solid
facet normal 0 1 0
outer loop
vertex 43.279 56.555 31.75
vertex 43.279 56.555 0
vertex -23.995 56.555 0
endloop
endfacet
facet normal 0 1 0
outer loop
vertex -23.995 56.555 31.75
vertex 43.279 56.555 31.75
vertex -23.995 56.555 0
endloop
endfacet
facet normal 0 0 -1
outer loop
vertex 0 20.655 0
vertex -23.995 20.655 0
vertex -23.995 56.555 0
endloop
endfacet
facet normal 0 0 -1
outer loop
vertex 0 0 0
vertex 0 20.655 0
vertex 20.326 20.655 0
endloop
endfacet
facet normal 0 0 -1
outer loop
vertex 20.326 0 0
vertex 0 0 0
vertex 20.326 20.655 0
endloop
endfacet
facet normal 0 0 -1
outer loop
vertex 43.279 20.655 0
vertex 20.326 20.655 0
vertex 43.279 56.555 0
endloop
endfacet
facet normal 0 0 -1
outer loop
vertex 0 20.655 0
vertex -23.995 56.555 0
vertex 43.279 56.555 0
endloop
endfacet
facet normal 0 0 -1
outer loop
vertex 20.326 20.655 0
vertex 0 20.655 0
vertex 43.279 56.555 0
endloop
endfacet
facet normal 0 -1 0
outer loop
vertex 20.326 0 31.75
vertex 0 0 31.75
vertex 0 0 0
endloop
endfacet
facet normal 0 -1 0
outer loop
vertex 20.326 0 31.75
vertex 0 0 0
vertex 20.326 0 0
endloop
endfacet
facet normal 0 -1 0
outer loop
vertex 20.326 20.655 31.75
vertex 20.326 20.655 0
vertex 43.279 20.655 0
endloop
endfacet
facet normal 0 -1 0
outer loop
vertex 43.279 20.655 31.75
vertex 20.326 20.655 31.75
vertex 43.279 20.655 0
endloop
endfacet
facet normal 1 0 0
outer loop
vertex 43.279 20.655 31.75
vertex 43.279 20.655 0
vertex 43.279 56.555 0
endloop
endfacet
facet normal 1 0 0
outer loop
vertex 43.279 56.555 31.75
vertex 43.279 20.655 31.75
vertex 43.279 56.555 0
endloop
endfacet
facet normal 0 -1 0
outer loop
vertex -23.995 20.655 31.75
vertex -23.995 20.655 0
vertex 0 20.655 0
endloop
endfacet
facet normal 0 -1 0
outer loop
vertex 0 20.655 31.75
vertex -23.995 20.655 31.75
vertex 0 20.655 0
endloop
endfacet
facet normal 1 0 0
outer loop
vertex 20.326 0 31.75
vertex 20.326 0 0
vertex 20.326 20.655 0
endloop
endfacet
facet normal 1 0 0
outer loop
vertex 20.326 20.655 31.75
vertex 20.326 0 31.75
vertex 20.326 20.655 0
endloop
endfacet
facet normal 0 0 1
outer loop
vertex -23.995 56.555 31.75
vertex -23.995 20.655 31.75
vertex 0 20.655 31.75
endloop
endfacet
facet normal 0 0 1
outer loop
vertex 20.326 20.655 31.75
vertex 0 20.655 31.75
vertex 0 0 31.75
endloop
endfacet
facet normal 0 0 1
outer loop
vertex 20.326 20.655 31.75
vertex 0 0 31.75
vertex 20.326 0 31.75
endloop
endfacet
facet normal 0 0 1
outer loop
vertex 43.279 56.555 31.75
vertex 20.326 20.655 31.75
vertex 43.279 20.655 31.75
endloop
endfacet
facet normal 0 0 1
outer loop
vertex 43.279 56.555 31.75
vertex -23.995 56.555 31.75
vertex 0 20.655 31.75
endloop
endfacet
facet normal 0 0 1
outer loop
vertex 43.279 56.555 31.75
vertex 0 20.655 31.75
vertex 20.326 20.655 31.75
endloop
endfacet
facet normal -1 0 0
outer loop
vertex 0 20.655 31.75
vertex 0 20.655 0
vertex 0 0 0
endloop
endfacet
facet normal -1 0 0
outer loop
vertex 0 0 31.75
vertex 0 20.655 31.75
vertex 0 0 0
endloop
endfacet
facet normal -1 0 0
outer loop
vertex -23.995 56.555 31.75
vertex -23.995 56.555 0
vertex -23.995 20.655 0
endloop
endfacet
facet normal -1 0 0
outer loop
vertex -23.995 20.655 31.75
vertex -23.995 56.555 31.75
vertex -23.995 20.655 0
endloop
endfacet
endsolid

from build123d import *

# Parameters (mm, degrees)
F1_DEPTH = 25.4
F2_SCALE = 1.25


with BuildPart() as f1:
    # F0 (on Top) → F1 (new body)
    with BuildSketch(Plane.XY):
        Polygon((0, 16.5241323411), (0, 0), (16.2604935467, 0), (16.2604935467, 16.5241323411), (34.6229039133, 16.5241323411), (34.6229039133, 45.2440679073), (-19.1962253302, 45.2440679073), (-19.1962253302, 16.5241323411), align=None)
    extrude(amount=F1_DEPTH)


with BuildPart() as f1_1:
    # F2: moved
    add(f1.part.scale(F2_SCALE))


solid = f1_1.part
